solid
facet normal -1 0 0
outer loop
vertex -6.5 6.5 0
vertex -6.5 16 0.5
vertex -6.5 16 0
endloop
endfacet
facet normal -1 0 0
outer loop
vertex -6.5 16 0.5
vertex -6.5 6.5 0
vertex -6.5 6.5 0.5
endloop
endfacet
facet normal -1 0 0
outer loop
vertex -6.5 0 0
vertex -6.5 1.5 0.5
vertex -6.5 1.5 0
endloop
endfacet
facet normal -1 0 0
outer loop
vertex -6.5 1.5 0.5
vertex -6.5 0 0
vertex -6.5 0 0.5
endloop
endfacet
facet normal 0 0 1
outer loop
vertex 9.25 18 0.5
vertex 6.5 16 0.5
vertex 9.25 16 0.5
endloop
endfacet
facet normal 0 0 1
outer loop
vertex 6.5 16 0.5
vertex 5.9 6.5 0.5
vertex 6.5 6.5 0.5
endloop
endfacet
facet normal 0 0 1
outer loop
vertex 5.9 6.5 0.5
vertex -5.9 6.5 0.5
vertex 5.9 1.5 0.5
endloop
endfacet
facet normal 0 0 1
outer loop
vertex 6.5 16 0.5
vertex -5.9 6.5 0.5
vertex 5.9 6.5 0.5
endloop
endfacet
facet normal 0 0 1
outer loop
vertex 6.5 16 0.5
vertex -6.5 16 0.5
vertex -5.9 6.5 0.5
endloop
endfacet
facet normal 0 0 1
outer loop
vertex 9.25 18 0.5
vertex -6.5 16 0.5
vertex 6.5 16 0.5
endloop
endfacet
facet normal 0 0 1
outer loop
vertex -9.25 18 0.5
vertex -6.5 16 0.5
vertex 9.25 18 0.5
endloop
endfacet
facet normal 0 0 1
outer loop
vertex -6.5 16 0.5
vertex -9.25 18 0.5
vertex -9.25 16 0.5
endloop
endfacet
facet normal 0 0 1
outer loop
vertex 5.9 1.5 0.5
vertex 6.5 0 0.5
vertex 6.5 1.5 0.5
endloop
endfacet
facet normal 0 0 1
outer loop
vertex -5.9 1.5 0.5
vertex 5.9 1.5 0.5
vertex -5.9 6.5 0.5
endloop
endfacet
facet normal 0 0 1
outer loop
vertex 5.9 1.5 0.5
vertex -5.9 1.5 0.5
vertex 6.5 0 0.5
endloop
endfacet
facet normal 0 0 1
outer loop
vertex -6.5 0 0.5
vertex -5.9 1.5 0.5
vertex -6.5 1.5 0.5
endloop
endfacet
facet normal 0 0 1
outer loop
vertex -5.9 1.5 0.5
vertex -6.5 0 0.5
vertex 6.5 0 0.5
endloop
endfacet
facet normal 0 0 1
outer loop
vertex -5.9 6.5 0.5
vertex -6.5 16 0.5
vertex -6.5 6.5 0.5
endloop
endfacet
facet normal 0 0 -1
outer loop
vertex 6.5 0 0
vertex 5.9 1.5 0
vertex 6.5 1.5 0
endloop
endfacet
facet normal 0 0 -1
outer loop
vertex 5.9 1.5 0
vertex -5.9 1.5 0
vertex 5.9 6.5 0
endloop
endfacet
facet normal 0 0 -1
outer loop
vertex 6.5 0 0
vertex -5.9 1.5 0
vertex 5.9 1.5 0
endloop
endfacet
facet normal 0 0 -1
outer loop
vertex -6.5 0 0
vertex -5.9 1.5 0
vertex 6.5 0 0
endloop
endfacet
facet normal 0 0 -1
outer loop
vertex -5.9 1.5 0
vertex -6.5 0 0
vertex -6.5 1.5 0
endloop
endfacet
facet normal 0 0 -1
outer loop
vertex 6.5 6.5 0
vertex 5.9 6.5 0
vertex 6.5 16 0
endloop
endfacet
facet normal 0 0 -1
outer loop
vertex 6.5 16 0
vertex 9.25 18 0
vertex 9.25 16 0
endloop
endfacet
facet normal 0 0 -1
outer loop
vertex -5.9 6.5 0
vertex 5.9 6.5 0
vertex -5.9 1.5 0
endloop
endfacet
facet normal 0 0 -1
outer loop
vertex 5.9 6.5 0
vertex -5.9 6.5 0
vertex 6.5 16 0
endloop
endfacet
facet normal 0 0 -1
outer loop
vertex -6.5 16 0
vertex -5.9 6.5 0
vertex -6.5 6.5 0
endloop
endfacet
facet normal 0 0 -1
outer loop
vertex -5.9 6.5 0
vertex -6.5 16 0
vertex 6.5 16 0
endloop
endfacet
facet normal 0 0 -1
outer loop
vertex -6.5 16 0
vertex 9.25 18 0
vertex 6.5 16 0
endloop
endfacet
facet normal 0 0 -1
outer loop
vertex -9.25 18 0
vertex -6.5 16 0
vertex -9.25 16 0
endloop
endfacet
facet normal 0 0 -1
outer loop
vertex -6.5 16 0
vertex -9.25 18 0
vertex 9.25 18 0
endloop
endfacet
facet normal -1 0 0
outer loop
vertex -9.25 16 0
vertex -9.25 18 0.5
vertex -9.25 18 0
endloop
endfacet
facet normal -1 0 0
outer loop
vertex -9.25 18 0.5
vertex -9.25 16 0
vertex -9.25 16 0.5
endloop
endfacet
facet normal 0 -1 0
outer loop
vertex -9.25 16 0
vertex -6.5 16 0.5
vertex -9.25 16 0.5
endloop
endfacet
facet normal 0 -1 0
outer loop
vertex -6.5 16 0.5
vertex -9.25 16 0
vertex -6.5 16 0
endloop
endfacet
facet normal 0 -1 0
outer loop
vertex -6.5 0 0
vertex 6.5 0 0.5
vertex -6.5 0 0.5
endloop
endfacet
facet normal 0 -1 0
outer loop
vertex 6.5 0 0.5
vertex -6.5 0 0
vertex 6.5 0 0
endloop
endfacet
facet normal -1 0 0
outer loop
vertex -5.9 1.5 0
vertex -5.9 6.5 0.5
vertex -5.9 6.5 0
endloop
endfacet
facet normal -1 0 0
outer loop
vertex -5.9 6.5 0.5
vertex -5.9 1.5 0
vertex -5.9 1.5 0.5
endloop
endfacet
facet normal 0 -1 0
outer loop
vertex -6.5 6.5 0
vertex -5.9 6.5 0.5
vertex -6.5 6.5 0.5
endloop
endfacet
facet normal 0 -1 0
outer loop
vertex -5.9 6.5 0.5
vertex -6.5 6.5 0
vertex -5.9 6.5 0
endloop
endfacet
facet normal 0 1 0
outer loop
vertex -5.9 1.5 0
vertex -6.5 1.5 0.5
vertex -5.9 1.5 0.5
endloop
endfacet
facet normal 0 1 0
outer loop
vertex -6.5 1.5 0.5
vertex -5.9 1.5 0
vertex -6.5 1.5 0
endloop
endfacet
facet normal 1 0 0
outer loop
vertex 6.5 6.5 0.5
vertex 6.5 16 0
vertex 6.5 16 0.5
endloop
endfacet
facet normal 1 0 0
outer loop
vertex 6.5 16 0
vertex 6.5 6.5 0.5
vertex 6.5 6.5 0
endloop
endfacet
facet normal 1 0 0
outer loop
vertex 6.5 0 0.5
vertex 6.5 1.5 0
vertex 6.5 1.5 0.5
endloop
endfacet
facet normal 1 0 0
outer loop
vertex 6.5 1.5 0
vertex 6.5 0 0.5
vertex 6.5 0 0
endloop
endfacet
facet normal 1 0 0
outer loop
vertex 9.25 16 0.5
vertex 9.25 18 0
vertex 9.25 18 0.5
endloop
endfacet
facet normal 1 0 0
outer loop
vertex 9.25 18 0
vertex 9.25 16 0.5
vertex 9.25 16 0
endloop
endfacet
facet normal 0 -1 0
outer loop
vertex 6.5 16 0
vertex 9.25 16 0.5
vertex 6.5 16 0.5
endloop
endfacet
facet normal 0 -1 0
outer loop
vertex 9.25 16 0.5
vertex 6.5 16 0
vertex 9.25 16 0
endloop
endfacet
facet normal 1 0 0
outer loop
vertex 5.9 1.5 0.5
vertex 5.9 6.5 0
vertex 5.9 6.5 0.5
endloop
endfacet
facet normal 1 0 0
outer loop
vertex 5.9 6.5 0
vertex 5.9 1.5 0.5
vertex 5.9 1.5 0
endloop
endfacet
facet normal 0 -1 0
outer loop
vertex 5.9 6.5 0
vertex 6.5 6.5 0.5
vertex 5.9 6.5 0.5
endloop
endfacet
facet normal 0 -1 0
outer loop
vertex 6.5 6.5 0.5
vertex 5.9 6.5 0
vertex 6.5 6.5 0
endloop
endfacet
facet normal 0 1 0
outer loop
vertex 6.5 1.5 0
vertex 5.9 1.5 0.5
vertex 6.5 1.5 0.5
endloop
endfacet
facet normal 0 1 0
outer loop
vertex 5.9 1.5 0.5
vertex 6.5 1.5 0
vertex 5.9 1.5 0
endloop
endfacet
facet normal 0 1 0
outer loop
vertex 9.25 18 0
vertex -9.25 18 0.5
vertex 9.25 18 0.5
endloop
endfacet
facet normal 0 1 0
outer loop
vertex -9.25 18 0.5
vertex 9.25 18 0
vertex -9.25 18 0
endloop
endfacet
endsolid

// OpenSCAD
// file: modus.scad
//Corner Joint - allows the sides of two parts to create inlayed corner. Aids with welding.
//need to verify module math is the same throughout all parts.

module cornerjoint(Z,L,H,EndGap,PadL,PadH,CJangle,CJcenter){
    //change so that H = Z of inlayed part (usually 0.5)
    //add center and angle in degrees option, orgin far side of cut out area

     if((CJangle==0)&&(CJcenter==0))
      {    
        translate([0,0,0])
        rotate([0,0,CJangle])
        difference(){
        cube([L,H+PadH,Z]);
        translate([EndGap,H,0])
        cube([PadL,PadH,Z]);
        translate([L-EndGap-PadL,H,0])
        cube([PadL,PadH,Z]);}
      }    
else if((CJangle==90)&&(CJcenter==0))
      {    
        translate([H+PadH,0,0])
        rotate([0,0,CJangle])
        difference(){
        cube([L,H+PadH,Z]);
        translate([EndGap,H,0])
        cube([PadL,PadH,Z]);
        translate([L-EndGap-PadL,H,0])
        cube([PadL,PadH,Z]);}
      }
else if((CJangle==180)&&(CJcenter==0))       
      {    
        translate([L,H+PadH,0])
        rotate([0,0,CJangle])
        difference(){
        cube([L,H+PadH,Z]);
        translate([EndGap,H,0])
        cube([PadL,PadH,Z]);
        translate([L-EndGap-PadL,H,0])
        cube([PadL,PadH,Z]);}
      }
else if((CJangle==270)&&(CJcenter==0))
      {    
        translate([0,L,0])
        rotate([0,0,CJangle])
        difference(){
        cube([L,H+PadH,Z]);
        translate([EndGap,H,0])
        cube([PadL,PadH,Z]);
        translate([L-EndGap-PadL,H,0])
        cube([PadL,PadH,Z]);}
      }  
      
//centered     
   
else if((CJangle==0)&&(CJcenter==1))
      {    
        translate([-L/2,0,0])
        rotate([0,0,CJangle])
        difference(){
        cube([L,H+PadH,Z]);
        translate([EndGap,H,0])
        cube([PadL,PadH,Z]);
        translate([L-EndGap-PadL,H,0])
        cube([PadL,PadH,Z]);}
      }  
else if((CJangle==90)&&(CJcenter==1))
      {    
        translate([0,-L/2,0])
        rotate([0,0,CJangle])
        difference(){
        cube([L,H+PadH,Z]);
        translate([EndGap,H,0])
        cube([PadL,PadH,Z]);
        translate([L-EndGap-PadL,H,0])
        cube([PadL,PadH,Z]);}
      }
else if((CJangle==180)&&(CJcenter==1))       
      {    
        translate([L/2,0,0])
        rotate([0,0,CJangle])
        difference(){
        cube([L,H+PadH,Z]);
        translate([EndGap,H,0])
        cube([PadL,PadH,Z]);
        translate([L-EndGap-PadL,H,0])
        cube([PadL,PadH,Z]);}
      }
else if((CJangle==270)&&(CJcenter==1))
      {    
        translate([0,L/2,0])
        rotate([0,0,CJangle])
        difference(){
        cube([L,H+PadH,Z]);
        translate([EndGap,H,0])
        cube([PadL,PadH,Z]);
        translate([L-EndGap-PadL,H,0])
        cube([PadL,PadH,Z]);}
      }
} //end cornerjoint module

//Tab Insert - used to cut a hole for an abutting part to insert into. Typically aids with welding the two parts.
module tabinsert(X,Y,Z,dGap,cGap,c1,c2,c3,c4,c5,c6,c7,c8,center){
    translate([-dGap-(center*(X/2)),-dGap-(center*(Y/2)),0]){
        //main cut
        cube([X+(dGap*2),Y+(dGap*2),Z]);
        //corner c1c2
        translate([-cGap,(Y+(dGap*2))-c1+cGap,0])
            {
        cube([c2,c1,Z]);}
       //corner c3c4
       translate([(X+(dGap*2))-c3+cGap,(Y+(dGap*2))-c4+cGap,0]){
           cube([c3,c4,Z]);
       }
       //corner c5c6
       translate([(X+(dGap*2))-c6+cGap,-cGap,0])
      {
          cube([c6,c5,Z]);
      }
       
       //corner c7c8 
       translate([-cGap,-cGap,0]){
           cube([c7,c8,Z]);
       }
    
    } //end center translate
} //end tabinsert module
 
// file: vars.scad
brickW=6; 
brickL=12;
brickCH=6;

$fn=8; //defines resolution of circles. 8 is okay for review. 100  or greater should be used for for final dxf export.

dZstandard=0.5; //thickness of steel to be cut for drawer parts
fZstandard=0.5;
aZstandard=0.5; //thickness of steel to be cut for arm parts

fBOLTHOLEstandardD=1; //standard bolts used on frame
sliderodholeOD=1.2; 

dGap=0.03125; //gap between a hole cut's edge and the part sitting within the hole. //D3 appears to use 0.3125, is this in error?

//all parts set to standard thickness below
//off standard preferences can be defined below

//drawer
drawergap=0.0283;  //extra room for drawer to slide in the space between f1 and f4
drawerHgap=0.1884;  //total extra space from drawer sides to frame walls. sum of both sides.

d1z=dZstandard;
d2z=dZstandard;
d3z=dZstandard;
d4z=dZstandard;
d5z=dZstandard;
d6z=dZstandard;
d5z=dZstandard;
d7z=dZstandard;
d8z=dZstandard;
d9z=dZstandard;

//frame
f1x=24.2;
f1y=6;
f1z=0.5;


f2y=3.5;
f2z=fZstandard;

f3x=f1x;
f3y=3.5;
f3z=fZstandard;

f4y=11;
f4z=fZstandard;

f5y=3.5;
f5z=fZstandard;

f6y=8;
f6z=fZstandard;

f8y=brickW;
f8z=fZstandard;
f8boltD=1;

f9y=4.5;
f9x=43.5;  //set based on MAINcylinder
f9z=fZstandard;

f8x=f9x;

f11x=1.25;
f11z=fZstandard;

f13z=fZstandard;

//arms

a1x=4;
a1y=72; //calculate based on drawer cylinder
a1z=aZstandard;

a2x=6;
a2y=72;  //calculate based on drawer cylinder
a2z=aZstandard;

a4z=aZstandard;
a6z=aZstandard;

//
//Input your main cylinder's dimenions here
//
cylinderMAINminC2E=0; //main hydraulic cylinder's distance from center of mounting hole to the end of the shaft when fully compressed.
cylinderMAINmaxC2E=0; //main hydraulic cylinder's distance from center of mounting hole to the end of the shaft when fully extended.

//
//Input your drawer cylinder's dimenions here
//
cylinderDRAWERbodyH=3; //measured when in position, largest length from top to bottom of cylinder
cylinderDRAWERminC2C=0; //drawer's hydraulic cylinder's distance from the center of one mounting hole to the center of the other when fully compressed.
cylinderDRAWERmaxC2C=0; ///drawer's hydraulic cylinder's distance from the center of one mounting hole to the center of the other when fully extended.
cylinderDRAWERrodclevisW=2.5; //width of cylinders' clevis on end of rod
cylinderDRAWERrodclevisID=1;
cylinderDRAWERrodclevisOD=2;
cylinderDRAWERrearclevisW=2.5; //width of mounting clevis cylinder body
cylinderDRAWERrearclevisID=1;
cylinderDRAWERrearclevisOD=2;
cylinderDRAWERrearclevisClearance=3; //usable space around rear clevis pin (in diameter). be aware of hyraulic fittings.

//the following variables are calculated in order of dependence on preceding variables
d3x=brickL+(d2z*2);
d3y=brickCH-d1z;
d4x=brickW+d3z+d3z;
d4y=brickCH-d1z;
d5x=brickL+(d2z*2);
d5y=brickW;
d6x=brickL+(d2z*2);
d6y=brickCH;
d7x=cylinderDRAWERrearclevisClearance;
d7y=a4z+d8z+cylinderDRAWERbodyH;
d9x=cylinderDRAWERbodyH+d6z;
d9y=cylinderDRAWERbodyH+d8z;
d8x=brickL+(d2z*2);
d8y=max(5,(d9x-d6z));   //need to review fundamentals, 5 minimun unless d9 gets larger than d8
d1x=18.5;   //need to come up with a formula
d1y=18;     //need to come up with a formula
d2x=d8y+d6z+brickW+d3z+d5y+d3z;
d2y=brickCH;

f11y=f8y;
f6x=brickL+(d2z*2)+(f9y*2)+drawerHgap;
f8x=43.5;  //need to define based on MAINcylinder inputs


f2x=brickL+(d2z*2)+drawerHgap+(f9y*2)-(1.4*2);  //distance between large cut outs in f9

f5x=brickL+(d2z*2)+drawerHgap+(f9y*2)+(a1x*2); //distance between outer edges of each A1

f4x=f5x-0.5;   //same as f5 but minus 0.25 on each side to give a little overhang
// main file
include <vars.scad>;
use <modus.scad>;

d1p();

module d1p(){

difference(){
translate([-(d1x/2),0,0])
cube([d1x,d1y,d1z]);
translate([-(d1x/2),0,0])
cuts();
translate([(d1x/2),0,0])
mirror([1,0,0])
cuts();
} //end difference
module cuts(){
        cube([(d1x-brickL-d2z-d2z)/2,16,d1z]);
    translate([(d1x-brickL-d2z-d2z)/2,1.5,0]) //1.5 could be better defined
        cube([0.6,5,d1z]);  //June freecad model has larger cut out
} //end module

} //end d1p module
